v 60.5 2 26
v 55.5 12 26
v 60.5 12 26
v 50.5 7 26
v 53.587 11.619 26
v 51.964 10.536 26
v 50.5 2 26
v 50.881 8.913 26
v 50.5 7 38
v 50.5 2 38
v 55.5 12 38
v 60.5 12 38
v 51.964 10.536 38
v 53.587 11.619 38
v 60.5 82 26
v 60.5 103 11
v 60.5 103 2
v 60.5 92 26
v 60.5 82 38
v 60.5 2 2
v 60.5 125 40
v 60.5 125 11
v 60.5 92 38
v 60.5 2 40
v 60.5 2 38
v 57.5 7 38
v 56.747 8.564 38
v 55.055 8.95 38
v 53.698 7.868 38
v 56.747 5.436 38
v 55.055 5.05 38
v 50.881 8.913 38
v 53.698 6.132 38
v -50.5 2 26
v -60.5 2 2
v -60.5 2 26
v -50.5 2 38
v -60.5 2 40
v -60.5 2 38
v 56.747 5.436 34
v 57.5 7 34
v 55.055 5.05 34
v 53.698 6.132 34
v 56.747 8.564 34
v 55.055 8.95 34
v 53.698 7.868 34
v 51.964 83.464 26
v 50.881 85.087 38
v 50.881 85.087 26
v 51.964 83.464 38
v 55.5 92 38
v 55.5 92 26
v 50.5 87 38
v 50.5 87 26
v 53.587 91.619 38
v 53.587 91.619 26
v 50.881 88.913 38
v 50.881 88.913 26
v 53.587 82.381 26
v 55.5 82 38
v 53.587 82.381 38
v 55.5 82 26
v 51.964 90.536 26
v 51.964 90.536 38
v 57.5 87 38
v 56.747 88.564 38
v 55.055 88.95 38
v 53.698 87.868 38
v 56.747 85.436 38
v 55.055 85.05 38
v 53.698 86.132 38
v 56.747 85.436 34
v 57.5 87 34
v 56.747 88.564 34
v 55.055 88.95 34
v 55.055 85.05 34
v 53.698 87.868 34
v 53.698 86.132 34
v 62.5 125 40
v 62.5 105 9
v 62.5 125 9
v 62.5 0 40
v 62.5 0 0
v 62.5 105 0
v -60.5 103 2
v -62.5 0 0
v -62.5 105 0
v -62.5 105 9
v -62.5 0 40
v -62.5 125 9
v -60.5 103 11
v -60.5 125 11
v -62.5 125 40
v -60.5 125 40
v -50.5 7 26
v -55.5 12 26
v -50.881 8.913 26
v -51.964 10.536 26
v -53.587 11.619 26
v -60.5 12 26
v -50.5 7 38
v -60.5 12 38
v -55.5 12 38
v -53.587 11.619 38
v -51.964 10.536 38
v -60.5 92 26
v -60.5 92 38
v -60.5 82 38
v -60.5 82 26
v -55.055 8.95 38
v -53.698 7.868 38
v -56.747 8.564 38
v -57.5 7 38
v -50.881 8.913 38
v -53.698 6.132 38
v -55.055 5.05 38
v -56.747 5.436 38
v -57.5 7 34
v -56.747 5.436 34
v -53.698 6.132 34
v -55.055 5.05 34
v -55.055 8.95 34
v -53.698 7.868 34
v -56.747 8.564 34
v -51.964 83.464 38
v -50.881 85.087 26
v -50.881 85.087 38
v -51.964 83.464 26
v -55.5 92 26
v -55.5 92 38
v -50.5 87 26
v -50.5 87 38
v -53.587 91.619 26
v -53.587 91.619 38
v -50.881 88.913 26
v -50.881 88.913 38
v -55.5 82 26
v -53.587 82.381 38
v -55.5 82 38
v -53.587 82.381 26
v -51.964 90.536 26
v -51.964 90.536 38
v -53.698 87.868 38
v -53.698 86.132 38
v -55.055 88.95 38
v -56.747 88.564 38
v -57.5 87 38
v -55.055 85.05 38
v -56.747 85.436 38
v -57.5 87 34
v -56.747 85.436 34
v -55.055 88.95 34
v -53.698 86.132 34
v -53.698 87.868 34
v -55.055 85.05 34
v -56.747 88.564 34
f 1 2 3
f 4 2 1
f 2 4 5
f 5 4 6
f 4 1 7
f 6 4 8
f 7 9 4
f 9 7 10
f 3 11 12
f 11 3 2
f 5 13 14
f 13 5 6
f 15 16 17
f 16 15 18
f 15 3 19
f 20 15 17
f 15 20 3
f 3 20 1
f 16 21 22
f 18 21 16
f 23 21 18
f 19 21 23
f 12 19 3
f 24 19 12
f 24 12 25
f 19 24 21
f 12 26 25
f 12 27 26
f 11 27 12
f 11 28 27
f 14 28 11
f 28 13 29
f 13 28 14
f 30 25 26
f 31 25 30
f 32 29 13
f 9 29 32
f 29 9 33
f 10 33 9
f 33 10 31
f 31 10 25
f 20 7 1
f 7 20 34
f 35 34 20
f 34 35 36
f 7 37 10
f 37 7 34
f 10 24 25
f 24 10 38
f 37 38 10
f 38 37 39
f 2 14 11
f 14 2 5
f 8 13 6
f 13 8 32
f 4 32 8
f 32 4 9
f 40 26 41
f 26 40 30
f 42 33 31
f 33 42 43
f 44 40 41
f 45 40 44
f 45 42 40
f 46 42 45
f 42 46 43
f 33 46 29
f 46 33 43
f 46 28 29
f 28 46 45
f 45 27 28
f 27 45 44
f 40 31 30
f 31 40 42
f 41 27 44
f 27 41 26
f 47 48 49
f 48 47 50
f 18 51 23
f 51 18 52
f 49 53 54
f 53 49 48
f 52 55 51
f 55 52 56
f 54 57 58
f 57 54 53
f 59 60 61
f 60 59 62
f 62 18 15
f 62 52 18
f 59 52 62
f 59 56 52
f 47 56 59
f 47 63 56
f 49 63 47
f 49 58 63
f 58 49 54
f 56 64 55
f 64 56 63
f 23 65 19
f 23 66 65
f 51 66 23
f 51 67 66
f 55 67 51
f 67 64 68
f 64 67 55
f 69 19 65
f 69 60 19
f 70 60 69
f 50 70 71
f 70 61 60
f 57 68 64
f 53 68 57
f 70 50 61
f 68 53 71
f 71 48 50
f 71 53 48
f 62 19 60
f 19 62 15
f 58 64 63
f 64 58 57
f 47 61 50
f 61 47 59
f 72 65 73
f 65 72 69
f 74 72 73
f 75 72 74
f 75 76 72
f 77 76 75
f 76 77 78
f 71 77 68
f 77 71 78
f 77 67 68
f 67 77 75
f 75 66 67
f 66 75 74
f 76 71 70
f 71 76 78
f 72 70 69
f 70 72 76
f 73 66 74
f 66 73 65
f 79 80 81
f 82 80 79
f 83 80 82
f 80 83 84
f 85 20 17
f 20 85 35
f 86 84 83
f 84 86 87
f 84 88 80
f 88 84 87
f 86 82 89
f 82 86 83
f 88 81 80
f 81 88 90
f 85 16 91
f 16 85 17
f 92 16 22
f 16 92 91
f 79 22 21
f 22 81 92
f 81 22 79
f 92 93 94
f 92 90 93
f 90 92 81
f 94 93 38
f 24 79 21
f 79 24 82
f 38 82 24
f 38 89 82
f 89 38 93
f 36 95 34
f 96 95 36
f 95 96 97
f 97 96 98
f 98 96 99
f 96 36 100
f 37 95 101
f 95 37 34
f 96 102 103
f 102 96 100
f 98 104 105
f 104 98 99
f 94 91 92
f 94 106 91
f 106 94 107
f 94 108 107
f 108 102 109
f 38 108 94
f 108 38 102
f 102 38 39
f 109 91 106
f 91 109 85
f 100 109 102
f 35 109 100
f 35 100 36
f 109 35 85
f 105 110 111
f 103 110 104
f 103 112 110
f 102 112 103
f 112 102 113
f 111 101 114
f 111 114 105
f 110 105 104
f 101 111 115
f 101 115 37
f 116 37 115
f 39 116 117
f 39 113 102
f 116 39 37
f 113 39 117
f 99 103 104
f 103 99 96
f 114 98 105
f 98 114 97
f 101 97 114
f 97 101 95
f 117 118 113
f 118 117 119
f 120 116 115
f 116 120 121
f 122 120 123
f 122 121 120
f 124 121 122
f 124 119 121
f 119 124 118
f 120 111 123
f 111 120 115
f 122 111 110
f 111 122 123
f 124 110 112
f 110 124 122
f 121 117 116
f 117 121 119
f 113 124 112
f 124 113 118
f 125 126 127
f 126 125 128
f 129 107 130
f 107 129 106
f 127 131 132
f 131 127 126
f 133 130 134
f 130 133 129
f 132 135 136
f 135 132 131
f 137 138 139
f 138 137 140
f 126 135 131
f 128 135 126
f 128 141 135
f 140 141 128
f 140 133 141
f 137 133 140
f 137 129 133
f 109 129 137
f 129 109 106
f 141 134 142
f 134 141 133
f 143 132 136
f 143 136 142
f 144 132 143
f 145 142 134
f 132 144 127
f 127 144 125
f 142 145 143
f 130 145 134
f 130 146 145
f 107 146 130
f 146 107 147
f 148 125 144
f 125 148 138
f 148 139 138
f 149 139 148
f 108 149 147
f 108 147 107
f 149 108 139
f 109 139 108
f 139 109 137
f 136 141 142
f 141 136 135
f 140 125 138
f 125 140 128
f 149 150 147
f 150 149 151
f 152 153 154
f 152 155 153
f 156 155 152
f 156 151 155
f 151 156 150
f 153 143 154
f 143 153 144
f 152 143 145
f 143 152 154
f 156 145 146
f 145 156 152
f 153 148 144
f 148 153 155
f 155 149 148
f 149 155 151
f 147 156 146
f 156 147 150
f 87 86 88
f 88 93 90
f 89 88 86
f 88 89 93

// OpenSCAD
base = [125, 105];
thick = 2;
height = 40;
mount_height = 12;
mount_hole_depth = 7;
mount_hole_diameter = 4;

module halfbox()
{
	hbase = [base.x/2, base.y];

	cube([hbase.x, hbase.y, thick]);

	let(z=thick)
	{
		translate([0,0,z])
		linear_extrude(height=9-z)
		difference()
		{
			square(hbase);
			translate([0,thick,0])
				square(hbase - [thick,2*thick]);
		};
	};

	let(z=9)
	{
		translate([0,0,z])
		linear_extrude(height=thick)
		difference() {
			square([hbase.x, hbase.y + 20]);
			translate([0, thick, 0]) square(hbase - [thick,2*thick]);
		};
	};

	let(z=11)
	{
		translate([0,0,z])
		linear_extrude(height=height-z)
		difference() {
			square([hbase.x, hbase.y + 20]);
			translate([0, thick, 0])
				square(hbase - [thick,thick - 20]);
		};
	};

	
	let(z=height - thick - mount_height, r=5)
	{
		translate([hbase.x - r - thick,r + thick,z])
		difference()
		{
			linear_extrude(height=mount_height)
			hull()
			{
				polygon([[-r,-r], [r, -r], [r,r]]);
				circle(r=r);
			};

			translate([0,0,mount_height - mount_hole_diameter])
			linear_extrude(height=mount_hole_depth)
			circle(d=mount_hole_diameter);
		};

		translate([hbase.x - r - thick,r + thick + 80,z])
		difference()
		{
			linear_extrude(height=mount_height)
			hull()
			{
				polygon([[r,-r], [0, 0], [r,r]]);
				circle(r=r);
			};

			translate([0,0,mount_height - mount_hole_diameter])
			linear_extrude(height=mount_hole_depth)
			circle(d=mount_hole_diameter);
		};

	};
};

module box()
{
	halfbox();
	mirror(v=[1,0,0]) halfbox();
};

box();
